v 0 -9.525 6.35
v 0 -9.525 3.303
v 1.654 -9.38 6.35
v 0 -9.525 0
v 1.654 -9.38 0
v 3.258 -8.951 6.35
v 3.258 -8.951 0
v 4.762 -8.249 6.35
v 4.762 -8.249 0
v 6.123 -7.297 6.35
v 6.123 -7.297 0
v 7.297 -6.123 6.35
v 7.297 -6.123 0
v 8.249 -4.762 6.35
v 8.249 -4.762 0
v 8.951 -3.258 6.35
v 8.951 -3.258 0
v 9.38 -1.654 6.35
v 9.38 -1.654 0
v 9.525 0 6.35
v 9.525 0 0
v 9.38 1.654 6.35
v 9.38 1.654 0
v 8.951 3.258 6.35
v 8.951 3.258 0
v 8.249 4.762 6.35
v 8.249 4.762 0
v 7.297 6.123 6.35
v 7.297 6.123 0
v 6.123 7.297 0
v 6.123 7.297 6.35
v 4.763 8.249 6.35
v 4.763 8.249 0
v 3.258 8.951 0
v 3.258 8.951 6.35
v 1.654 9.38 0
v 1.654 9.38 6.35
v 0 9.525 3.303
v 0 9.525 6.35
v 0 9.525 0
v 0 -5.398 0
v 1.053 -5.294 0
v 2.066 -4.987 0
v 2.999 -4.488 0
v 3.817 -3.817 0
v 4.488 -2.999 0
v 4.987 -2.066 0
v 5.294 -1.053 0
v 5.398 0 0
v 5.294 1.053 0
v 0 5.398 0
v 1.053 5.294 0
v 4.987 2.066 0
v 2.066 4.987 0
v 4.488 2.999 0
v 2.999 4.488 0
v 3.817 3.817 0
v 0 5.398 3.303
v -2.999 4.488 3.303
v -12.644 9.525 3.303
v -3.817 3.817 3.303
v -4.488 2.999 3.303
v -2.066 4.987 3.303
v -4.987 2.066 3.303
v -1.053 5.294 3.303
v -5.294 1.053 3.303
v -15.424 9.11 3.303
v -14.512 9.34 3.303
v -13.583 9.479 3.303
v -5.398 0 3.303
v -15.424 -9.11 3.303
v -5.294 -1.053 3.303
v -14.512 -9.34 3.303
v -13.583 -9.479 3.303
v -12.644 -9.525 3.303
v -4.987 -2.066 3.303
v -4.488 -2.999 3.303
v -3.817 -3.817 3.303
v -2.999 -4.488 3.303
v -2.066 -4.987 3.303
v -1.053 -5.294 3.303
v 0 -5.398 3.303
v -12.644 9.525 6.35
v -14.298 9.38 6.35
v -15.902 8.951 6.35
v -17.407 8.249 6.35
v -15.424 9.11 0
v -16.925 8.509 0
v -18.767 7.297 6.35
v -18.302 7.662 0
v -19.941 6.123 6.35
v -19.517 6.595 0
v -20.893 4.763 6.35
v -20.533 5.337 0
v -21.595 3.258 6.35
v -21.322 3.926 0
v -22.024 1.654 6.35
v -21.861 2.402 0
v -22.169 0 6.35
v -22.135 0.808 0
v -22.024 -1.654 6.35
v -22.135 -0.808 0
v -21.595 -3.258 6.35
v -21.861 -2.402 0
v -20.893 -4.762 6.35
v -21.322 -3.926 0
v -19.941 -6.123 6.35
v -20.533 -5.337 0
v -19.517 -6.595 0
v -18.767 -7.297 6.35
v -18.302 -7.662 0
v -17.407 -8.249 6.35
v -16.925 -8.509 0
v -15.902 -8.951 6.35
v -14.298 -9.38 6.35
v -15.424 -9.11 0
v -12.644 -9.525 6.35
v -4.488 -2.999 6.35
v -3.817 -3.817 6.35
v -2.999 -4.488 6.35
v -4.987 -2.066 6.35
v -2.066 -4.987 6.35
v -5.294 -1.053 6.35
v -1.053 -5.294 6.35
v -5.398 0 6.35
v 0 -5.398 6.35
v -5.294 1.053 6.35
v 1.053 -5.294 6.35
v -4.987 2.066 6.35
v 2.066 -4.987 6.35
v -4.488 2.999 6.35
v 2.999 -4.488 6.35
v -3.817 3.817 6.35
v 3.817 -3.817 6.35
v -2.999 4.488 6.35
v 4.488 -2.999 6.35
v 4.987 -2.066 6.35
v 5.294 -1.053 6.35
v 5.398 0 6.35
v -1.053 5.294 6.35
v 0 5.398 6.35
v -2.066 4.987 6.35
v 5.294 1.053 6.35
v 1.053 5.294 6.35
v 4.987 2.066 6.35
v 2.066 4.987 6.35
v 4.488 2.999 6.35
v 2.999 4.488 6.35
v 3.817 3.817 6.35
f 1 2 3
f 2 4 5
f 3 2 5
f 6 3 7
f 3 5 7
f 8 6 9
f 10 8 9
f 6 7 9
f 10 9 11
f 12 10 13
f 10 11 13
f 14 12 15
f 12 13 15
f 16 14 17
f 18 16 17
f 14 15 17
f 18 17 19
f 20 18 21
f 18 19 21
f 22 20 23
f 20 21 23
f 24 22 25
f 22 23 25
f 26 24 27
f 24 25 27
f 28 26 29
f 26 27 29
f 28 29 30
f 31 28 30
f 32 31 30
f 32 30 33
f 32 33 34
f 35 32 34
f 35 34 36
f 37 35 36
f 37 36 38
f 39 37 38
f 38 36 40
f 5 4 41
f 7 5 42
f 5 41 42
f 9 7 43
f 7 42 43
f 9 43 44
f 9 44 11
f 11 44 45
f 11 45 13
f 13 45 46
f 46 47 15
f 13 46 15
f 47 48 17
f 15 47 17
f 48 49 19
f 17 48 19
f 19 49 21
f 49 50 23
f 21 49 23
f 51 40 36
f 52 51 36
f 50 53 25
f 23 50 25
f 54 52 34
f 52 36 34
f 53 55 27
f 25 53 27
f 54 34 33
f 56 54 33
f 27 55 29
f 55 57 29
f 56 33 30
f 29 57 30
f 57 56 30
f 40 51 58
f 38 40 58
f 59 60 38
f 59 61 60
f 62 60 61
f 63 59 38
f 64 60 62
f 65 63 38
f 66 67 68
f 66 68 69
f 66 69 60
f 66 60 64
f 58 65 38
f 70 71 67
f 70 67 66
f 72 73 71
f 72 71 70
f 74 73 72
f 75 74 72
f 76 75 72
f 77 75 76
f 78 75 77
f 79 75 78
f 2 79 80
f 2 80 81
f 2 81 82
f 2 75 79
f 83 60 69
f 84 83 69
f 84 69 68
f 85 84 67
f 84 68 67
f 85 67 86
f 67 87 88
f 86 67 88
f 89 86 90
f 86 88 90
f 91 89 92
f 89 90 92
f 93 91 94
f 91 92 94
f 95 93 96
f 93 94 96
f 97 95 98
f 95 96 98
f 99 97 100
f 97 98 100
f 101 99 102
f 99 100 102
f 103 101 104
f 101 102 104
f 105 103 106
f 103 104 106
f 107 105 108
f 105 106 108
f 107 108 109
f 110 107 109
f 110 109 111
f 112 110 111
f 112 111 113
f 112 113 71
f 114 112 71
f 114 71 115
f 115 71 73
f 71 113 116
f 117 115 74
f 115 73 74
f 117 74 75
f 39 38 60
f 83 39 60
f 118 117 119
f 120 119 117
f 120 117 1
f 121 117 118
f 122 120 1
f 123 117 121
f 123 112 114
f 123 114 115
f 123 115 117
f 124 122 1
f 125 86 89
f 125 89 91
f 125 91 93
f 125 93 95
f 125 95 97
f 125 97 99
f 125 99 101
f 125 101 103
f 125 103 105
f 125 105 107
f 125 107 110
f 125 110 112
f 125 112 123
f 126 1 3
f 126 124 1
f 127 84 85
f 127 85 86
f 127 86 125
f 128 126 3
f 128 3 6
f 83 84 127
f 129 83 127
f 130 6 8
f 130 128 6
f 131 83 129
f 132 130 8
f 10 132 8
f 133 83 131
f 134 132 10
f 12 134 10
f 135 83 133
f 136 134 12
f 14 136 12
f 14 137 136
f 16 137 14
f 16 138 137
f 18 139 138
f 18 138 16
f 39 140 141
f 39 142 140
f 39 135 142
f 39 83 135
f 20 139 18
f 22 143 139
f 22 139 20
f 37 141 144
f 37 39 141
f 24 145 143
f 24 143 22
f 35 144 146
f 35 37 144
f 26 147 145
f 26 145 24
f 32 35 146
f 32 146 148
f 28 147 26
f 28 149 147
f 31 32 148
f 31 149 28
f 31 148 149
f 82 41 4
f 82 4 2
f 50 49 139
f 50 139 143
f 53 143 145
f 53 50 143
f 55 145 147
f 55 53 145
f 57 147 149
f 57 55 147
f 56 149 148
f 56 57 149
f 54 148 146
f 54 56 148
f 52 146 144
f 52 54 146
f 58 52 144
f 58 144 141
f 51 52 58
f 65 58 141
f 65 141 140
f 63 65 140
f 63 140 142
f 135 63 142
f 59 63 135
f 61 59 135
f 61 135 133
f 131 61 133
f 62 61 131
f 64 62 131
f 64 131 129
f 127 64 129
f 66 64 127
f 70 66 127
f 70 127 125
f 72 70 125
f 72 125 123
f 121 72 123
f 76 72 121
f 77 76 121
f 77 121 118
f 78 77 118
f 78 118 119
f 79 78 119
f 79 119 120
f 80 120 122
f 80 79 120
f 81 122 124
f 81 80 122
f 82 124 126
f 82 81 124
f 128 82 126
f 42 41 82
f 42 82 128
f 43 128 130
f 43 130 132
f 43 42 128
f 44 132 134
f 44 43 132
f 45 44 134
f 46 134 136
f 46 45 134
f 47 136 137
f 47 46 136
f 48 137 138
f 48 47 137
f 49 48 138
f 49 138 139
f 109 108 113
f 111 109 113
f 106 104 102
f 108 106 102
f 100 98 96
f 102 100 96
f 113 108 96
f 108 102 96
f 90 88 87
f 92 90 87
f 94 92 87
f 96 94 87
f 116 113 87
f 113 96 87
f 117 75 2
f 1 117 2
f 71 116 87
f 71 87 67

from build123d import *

# Parameters (mm, degrees)
F0_R          = 5.3975
F1_DEPTH      = 6.35
F2_W          = 15.4239367694
F2_H          = 3.302921541
F3_DEPTH      = 25.4
F3_DEPTH_BACK = 25.4


with BuildPart() as f1:
    # F0 (on Top) → F1 (new body)
    with BuildSketch(Plane.XY):
        with BuildLine():
            Line((0, 9.525), (-12.6440079791, 9.525))
            Line((-12.6440079791, 9.525), (-12.6440079791, -9.525))
            Line((-12.6440079791, -9.525), (0, -9.525))
            ThreePointArc((0, -9.525), (9.525, 0), (0, 9.525))
        make_face()
        Circle(F0_R, mode=Mode.SUBTRACT)
        with BuildLine():
            Line((-12.6440079791, -9.525), (-12.6440079791, 9.525))
            ThreePointArc((-12.6440079791, 9.525), (-22.1690079791, 0), (-12.6440079791, -9.525))
        make_face()
    extrude(amount=F1_DEPTH)

    # F2 (on Front) → F3 (cut, two sides)
    with BuildSketch(Plane.XZ) as f3_sk:
        with Locations((-7.7119683847, 1.6514607705)):
            Rectangle(F2_W, F2_H)
    extrude(amount=-F3_DEPTH, mode=Mode.SUBTRACT)
    extrude(f3_sk.sketch, amount=F3_DEPTH_BACK, mode=Mode.SUBTRACT)


solid = f1.part
